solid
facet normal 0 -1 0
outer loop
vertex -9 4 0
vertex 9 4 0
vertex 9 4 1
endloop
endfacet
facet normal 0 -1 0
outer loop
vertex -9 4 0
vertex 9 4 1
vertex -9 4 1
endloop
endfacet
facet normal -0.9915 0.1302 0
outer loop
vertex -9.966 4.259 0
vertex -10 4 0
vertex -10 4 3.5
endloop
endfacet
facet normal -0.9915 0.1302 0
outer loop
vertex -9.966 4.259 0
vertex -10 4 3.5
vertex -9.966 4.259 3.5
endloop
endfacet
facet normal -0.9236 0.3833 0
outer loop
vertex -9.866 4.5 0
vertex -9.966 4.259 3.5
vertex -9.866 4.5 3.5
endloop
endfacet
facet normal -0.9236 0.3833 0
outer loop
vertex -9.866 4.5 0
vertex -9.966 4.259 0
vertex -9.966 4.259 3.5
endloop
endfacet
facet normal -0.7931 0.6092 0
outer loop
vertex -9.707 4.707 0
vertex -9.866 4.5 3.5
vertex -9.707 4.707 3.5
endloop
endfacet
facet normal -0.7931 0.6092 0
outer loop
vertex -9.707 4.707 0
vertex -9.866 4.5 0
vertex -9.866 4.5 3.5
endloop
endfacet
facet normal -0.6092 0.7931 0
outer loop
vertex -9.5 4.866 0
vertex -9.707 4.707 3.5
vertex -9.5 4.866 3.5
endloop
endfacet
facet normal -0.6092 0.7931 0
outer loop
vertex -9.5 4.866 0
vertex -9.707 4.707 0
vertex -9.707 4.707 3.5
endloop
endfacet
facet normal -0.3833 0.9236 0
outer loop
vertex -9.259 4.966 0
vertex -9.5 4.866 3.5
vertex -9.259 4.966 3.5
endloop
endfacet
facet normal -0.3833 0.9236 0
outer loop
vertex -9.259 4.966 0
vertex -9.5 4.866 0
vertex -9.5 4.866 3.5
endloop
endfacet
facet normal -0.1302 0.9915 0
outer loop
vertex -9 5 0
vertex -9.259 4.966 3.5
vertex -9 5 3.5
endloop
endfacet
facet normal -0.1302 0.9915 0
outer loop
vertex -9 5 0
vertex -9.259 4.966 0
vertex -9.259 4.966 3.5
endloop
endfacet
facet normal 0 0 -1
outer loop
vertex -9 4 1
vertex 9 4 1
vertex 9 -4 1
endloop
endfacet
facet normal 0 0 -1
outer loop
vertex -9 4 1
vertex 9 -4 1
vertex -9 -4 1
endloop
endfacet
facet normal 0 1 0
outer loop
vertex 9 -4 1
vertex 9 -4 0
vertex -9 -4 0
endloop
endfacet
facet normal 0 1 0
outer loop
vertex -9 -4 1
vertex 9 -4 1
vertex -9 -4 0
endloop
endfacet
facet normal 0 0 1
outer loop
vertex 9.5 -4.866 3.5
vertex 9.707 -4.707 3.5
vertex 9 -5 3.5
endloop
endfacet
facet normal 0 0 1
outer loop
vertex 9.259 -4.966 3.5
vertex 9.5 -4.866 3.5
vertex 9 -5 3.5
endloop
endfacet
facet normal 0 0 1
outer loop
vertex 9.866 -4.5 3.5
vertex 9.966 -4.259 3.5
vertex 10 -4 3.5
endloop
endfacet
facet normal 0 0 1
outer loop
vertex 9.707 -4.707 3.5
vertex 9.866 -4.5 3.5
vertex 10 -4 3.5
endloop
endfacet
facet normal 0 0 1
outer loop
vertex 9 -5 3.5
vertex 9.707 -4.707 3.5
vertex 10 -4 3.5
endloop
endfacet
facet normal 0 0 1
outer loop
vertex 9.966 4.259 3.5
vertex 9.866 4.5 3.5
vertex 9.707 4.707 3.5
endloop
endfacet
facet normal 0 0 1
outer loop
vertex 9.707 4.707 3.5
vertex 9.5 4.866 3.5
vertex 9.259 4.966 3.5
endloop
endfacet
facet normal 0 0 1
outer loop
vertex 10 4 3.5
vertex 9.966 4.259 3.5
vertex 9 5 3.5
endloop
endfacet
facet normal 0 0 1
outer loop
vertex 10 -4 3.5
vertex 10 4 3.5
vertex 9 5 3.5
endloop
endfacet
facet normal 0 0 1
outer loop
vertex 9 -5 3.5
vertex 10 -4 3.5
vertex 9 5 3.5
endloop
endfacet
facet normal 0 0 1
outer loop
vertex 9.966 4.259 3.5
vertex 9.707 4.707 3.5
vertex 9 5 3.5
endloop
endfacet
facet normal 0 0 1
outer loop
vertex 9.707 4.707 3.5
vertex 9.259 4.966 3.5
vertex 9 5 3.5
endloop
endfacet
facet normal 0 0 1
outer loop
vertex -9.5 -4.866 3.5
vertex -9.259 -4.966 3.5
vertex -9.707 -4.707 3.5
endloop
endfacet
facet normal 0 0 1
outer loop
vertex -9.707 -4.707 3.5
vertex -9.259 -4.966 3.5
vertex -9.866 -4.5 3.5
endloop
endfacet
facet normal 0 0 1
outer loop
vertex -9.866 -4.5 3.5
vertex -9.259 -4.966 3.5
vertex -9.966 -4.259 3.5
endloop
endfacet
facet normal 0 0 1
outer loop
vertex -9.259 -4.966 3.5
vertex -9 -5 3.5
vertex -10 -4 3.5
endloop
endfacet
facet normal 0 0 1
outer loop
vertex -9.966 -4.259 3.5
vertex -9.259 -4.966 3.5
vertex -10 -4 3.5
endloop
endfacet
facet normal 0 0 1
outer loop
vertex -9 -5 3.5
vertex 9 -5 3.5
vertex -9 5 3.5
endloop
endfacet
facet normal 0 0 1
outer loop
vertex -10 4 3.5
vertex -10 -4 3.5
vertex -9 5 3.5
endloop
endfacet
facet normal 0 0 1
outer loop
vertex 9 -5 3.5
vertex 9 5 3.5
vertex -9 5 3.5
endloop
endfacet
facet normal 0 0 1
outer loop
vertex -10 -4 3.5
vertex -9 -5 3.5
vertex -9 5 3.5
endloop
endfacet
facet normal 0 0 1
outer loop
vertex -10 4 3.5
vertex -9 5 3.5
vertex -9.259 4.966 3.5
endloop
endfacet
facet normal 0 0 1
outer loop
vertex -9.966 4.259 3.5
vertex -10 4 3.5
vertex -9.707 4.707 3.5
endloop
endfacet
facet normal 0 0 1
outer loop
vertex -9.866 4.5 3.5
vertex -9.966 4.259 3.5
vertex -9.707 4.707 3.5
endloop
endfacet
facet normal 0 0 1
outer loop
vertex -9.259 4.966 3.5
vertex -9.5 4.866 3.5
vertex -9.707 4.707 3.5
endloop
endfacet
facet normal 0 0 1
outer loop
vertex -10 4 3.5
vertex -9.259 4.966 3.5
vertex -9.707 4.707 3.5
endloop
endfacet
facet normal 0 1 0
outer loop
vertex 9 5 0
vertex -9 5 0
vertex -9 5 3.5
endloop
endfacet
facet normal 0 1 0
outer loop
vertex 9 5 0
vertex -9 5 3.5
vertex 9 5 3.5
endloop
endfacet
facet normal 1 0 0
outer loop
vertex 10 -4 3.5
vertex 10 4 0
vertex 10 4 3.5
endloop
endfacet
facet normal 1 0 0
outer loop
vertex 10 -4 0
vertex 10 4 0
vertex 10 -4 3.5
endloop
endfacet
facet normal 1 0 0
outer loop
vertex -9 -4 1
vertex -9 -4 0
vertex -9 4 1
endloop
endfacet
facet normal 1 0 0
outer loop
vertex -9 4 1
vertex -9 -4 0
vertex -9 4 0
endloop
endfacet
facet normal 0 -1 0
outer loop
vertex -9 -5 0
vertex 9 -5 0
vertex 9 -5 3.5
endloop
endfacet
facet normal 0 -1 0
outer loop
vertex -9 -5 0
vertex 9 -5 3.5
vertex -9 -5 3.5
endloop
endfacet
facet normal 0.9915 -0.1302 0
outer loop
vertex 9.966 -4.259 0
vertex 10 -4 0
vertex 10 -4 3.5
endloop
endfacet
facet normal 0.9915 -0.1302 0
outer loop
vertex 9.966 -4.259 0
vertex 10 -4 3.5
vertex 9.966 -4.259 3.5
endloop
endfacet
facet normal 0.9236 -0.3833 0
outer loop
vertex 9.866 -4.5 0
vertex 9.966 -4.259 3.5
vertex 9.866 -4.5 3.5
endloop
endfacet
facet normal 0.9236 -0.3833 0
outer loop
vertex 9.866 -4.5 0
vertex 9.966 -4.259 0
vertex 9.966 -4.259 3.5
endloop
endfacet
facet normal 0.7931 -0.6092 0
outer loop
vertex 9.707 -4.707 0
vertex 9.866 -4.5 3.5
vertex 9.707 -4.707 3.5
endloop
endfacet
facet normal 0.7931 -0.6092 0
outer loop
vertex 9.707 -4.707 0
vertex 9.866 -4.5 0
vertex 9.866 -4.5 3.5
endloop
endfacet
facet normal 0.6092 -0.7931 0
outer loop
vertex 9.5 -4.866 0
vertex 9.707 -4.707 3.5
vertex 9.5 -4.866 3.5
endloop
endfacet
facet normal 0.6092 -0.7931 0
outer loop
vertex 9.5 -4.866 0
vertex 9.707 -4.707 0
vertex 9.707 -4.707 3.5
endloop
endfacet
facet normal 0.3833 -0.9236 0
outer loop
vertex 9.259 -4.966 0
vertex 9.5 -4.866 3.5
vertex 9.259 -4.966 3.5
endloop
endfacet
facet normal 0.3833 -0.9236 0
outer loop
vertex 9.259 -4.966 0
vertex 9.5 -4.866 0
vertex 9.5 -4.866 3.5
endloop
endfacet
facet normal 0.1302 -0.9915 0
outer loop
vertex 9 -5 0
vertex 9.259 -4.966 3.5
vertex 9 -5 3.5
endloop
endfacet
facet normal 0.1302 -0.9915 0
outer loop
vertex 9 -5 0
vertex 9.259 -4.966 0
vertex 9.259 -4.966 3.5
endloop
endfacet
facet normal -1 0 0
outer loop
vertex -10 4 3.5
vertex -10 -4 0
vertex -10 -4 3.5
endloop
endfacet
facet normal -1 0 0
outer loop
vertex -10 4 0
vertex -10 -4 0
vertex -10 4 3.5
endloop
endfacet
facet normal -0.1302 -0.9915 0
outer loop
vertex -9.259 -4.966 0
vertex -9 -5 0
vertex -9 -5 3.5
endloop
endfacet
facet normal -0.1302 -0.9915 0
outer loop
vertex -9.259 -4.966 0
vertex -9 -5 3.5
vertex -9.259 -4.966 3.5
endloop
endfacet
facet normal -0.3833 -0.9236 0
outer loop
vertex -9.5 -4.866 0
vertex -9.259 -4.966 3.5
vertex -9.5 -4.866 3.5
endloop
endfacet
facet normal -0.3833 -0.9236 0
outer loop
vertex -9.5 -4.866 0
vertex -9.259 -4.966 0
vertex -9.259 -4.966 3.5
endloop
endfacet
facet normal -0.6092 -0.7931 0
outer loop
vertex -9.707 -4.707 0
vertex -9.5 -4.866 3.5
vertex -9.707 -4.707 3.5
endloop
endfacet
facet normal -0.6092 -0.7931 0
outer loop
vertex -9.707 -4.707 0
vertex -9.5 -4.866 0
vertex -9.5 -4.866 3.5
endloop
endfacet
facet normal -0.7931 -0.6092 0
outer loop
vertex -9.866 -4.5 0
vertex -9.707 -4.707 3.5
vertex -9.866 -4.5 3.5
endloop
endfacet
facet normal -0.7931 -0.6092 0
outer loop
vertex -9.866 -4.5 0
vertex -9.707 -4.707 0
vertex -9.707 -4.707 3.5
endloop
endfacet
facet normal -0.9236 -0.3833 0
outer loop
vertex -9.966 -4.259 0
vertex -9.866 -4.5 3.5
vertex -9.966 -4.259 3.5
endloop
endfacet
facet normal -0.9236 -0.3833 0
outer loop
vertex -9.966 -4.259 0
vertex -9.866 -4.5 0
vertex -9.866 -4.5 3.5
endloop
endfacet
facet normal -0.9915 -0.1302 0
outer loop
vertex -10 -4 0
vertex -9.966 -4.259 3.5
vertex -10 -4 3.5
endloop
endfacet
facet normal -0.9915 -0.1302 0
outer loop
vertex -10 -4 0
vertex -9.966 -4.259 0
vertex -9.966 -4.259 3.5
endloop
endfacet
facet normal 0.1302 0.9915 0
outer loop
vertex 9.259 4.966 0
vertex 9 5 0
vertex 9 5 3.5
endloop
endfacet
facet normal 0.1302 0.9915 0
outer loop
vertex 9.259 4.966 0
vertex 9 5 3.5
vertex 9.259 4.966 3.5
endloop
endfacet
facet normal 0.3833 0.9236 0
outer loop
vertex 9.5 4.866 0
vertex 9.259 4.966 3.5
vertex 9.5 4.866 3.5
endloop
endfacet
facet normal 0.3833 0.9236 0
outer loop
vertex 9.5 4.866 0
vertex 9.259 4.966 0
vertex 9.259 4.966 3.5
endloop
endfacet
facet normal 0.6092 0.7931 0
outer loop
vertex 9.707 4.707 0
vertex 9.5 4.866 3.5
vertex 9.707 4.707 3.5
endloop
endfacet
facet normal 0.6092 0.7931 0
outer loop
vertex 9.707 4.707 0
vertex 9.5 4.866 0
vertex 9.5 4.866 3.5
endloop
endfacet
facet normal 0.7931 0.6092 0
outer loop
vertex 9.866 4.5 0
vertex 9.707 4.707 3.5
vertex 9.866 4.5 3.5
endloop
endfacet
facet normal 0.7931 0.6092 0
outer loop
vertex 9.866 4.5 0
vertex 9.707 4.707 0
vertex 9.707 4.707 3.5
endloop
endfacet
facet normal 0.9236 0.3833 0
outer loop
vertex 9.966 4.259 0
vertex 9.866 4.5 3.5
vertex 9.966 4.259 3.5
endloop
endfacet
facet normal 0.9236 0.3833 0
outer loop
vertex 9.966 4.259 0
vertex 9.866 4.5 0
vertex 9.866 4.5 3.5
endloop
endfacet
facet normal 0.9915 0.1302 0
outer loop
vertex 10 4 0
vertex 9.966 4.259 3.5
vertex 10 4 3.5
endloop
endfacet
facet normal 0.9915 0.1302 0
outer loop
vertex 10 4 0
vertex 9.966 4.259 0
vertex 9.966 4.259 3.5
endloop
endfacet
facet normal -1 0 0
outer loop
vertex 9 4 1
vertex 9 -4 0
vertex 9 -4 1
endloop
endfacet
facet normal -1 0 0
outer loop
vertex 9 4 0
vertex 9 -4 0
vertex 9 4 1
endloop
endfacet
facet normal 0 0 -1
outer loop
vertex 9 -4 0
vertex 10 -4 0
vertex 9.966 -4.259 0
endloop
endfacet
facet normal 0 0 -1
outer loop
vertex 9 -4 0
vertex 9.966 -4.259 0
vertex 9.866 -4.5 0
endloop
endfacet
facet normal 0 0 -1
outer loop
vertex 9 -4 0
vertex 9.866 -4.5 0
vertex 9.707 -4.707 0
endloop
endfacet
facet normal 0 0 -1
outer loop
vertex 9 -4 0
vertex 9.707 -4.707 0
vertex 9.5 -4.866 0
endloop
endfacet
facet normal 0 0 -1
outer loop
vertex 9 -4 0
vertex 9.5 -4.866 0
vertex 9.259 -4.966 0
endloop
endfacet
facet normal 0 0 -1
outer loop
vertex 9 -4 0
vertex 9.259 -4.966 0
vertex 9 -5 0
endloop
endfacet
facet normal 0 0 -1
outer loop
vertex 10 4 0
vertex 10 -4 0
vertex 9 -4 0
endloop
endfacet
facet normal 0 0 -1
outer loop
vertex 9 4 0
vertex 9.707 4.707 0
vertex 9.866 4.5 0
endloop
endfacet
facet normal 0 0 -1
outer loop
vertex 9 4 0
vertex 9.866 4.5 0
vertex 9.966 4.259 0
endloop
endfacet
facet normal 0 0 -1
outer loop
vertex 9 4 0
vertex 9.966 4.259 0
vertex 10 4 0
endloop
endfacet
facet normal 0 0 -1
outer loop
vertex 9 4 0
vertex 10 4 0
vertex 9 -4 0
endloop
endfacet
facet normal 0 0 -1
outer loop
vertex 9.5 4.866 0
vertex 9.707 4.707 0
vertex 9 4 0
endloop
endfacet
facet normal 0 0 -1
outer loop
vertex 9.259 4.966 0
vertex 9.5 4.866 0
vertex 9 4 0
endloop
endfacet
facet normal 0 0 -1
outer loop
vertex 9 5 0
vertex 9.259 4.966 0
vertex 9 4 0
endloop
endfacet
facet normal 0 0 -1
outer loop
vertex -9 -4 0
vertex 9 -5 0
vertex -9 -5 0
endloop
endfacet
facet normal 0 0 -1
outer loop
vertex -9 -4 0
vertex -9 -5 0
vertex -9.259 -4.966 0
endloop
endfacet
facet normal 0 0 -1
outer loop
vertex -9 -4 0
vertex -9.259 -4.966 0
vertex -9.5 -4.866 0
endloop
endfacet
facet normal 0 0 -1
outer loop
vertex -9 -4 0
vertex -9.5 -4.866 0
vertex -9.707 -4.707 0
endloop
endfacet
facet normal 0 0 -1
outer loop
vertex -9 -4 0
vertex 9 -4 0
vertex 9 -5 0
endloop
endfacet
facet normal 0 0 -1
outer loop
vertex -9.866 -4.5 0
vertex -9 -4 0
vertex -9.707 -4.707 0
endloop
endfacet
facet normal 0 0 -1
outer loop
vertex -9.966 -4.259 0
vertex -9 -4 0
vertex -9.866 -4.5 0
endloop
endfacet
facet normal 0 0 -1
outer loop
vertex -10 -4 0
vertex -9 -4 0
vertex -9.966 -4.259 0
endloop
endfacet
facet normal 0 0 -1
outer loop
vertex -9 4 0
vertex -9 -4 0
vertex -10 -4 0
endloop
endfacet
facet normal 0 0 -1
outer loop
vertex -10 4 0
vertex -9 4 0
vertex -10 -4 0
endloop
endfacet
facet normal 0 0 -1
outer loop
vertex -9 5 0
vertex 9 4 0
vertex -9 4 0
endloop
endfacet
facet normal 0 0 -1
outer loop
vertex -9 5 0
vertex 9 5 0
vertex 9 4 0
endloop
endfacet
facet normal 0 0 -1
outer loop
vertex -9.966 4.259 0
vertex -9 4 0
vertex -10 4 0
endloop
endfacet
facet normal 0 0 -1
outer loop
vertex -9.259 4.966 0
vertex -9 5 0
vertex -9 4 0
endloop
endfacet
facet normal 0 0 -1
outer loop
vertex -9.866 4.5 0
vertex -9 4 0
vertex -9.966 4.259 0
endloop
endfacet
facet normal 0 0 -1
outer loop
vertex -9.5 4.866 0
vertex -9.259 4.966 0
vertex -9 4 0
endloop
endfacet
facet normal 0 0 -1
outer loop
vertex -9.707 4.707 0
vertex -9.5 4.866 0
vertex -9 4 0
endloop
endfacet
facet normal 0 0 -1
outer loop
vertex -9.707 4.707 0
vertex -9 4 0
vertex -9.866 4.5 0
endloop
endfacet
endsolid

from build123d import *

# Parameters (mm, degrees)
BOSS_EXTRUDE1_DEPTH = 3.5
SKETCH2_W           = 18
SKETCH2_H           = 8
CUT_EXTRUDE1_DEPTH  = 1


with BuildPart() as part:
    # Sketch1 → Boss-Extrude1 (new body)
    with BuildSketch(Plane.XY):
        with BuildLine():
            Line((-9, 5), (9, 5))
            ThreePointArc((9, 5), (9.707106781, 4.707106781), (10, 4))
            Line((10, 4), (10, -4))
            ThreePointArc((10, -4), (9.707106781, -4.707106781), (9, -5))
            Line((9, -5), (-9, -5))
            ThreePointArc((-9, -5), (-9.707106781, -4.707106781), (-10, -4))
            Line((-10, -4), (-10, 4))
            ThreePointArc((-10, 4), (-9.707106781, 4.707106781), (-9, 5))
        make_face()
    extrude(amount=BOSS_EXTRUDE1_DEPTH)

    # Sketch2 → Cut-Extrude1 (cut)
    with BuildSketch(Plane(origin=(0, 0, 0), x_dir=(-1, 0, 0), z_dir=(0, 0, -1))):
        Rectangle(SKETCH2_W, SKETCH2_H)
    extrude(amount=-CUT_EXTRUDE1_DEPTH, mode=Mode.SUBTRACT)


solid = part.part
